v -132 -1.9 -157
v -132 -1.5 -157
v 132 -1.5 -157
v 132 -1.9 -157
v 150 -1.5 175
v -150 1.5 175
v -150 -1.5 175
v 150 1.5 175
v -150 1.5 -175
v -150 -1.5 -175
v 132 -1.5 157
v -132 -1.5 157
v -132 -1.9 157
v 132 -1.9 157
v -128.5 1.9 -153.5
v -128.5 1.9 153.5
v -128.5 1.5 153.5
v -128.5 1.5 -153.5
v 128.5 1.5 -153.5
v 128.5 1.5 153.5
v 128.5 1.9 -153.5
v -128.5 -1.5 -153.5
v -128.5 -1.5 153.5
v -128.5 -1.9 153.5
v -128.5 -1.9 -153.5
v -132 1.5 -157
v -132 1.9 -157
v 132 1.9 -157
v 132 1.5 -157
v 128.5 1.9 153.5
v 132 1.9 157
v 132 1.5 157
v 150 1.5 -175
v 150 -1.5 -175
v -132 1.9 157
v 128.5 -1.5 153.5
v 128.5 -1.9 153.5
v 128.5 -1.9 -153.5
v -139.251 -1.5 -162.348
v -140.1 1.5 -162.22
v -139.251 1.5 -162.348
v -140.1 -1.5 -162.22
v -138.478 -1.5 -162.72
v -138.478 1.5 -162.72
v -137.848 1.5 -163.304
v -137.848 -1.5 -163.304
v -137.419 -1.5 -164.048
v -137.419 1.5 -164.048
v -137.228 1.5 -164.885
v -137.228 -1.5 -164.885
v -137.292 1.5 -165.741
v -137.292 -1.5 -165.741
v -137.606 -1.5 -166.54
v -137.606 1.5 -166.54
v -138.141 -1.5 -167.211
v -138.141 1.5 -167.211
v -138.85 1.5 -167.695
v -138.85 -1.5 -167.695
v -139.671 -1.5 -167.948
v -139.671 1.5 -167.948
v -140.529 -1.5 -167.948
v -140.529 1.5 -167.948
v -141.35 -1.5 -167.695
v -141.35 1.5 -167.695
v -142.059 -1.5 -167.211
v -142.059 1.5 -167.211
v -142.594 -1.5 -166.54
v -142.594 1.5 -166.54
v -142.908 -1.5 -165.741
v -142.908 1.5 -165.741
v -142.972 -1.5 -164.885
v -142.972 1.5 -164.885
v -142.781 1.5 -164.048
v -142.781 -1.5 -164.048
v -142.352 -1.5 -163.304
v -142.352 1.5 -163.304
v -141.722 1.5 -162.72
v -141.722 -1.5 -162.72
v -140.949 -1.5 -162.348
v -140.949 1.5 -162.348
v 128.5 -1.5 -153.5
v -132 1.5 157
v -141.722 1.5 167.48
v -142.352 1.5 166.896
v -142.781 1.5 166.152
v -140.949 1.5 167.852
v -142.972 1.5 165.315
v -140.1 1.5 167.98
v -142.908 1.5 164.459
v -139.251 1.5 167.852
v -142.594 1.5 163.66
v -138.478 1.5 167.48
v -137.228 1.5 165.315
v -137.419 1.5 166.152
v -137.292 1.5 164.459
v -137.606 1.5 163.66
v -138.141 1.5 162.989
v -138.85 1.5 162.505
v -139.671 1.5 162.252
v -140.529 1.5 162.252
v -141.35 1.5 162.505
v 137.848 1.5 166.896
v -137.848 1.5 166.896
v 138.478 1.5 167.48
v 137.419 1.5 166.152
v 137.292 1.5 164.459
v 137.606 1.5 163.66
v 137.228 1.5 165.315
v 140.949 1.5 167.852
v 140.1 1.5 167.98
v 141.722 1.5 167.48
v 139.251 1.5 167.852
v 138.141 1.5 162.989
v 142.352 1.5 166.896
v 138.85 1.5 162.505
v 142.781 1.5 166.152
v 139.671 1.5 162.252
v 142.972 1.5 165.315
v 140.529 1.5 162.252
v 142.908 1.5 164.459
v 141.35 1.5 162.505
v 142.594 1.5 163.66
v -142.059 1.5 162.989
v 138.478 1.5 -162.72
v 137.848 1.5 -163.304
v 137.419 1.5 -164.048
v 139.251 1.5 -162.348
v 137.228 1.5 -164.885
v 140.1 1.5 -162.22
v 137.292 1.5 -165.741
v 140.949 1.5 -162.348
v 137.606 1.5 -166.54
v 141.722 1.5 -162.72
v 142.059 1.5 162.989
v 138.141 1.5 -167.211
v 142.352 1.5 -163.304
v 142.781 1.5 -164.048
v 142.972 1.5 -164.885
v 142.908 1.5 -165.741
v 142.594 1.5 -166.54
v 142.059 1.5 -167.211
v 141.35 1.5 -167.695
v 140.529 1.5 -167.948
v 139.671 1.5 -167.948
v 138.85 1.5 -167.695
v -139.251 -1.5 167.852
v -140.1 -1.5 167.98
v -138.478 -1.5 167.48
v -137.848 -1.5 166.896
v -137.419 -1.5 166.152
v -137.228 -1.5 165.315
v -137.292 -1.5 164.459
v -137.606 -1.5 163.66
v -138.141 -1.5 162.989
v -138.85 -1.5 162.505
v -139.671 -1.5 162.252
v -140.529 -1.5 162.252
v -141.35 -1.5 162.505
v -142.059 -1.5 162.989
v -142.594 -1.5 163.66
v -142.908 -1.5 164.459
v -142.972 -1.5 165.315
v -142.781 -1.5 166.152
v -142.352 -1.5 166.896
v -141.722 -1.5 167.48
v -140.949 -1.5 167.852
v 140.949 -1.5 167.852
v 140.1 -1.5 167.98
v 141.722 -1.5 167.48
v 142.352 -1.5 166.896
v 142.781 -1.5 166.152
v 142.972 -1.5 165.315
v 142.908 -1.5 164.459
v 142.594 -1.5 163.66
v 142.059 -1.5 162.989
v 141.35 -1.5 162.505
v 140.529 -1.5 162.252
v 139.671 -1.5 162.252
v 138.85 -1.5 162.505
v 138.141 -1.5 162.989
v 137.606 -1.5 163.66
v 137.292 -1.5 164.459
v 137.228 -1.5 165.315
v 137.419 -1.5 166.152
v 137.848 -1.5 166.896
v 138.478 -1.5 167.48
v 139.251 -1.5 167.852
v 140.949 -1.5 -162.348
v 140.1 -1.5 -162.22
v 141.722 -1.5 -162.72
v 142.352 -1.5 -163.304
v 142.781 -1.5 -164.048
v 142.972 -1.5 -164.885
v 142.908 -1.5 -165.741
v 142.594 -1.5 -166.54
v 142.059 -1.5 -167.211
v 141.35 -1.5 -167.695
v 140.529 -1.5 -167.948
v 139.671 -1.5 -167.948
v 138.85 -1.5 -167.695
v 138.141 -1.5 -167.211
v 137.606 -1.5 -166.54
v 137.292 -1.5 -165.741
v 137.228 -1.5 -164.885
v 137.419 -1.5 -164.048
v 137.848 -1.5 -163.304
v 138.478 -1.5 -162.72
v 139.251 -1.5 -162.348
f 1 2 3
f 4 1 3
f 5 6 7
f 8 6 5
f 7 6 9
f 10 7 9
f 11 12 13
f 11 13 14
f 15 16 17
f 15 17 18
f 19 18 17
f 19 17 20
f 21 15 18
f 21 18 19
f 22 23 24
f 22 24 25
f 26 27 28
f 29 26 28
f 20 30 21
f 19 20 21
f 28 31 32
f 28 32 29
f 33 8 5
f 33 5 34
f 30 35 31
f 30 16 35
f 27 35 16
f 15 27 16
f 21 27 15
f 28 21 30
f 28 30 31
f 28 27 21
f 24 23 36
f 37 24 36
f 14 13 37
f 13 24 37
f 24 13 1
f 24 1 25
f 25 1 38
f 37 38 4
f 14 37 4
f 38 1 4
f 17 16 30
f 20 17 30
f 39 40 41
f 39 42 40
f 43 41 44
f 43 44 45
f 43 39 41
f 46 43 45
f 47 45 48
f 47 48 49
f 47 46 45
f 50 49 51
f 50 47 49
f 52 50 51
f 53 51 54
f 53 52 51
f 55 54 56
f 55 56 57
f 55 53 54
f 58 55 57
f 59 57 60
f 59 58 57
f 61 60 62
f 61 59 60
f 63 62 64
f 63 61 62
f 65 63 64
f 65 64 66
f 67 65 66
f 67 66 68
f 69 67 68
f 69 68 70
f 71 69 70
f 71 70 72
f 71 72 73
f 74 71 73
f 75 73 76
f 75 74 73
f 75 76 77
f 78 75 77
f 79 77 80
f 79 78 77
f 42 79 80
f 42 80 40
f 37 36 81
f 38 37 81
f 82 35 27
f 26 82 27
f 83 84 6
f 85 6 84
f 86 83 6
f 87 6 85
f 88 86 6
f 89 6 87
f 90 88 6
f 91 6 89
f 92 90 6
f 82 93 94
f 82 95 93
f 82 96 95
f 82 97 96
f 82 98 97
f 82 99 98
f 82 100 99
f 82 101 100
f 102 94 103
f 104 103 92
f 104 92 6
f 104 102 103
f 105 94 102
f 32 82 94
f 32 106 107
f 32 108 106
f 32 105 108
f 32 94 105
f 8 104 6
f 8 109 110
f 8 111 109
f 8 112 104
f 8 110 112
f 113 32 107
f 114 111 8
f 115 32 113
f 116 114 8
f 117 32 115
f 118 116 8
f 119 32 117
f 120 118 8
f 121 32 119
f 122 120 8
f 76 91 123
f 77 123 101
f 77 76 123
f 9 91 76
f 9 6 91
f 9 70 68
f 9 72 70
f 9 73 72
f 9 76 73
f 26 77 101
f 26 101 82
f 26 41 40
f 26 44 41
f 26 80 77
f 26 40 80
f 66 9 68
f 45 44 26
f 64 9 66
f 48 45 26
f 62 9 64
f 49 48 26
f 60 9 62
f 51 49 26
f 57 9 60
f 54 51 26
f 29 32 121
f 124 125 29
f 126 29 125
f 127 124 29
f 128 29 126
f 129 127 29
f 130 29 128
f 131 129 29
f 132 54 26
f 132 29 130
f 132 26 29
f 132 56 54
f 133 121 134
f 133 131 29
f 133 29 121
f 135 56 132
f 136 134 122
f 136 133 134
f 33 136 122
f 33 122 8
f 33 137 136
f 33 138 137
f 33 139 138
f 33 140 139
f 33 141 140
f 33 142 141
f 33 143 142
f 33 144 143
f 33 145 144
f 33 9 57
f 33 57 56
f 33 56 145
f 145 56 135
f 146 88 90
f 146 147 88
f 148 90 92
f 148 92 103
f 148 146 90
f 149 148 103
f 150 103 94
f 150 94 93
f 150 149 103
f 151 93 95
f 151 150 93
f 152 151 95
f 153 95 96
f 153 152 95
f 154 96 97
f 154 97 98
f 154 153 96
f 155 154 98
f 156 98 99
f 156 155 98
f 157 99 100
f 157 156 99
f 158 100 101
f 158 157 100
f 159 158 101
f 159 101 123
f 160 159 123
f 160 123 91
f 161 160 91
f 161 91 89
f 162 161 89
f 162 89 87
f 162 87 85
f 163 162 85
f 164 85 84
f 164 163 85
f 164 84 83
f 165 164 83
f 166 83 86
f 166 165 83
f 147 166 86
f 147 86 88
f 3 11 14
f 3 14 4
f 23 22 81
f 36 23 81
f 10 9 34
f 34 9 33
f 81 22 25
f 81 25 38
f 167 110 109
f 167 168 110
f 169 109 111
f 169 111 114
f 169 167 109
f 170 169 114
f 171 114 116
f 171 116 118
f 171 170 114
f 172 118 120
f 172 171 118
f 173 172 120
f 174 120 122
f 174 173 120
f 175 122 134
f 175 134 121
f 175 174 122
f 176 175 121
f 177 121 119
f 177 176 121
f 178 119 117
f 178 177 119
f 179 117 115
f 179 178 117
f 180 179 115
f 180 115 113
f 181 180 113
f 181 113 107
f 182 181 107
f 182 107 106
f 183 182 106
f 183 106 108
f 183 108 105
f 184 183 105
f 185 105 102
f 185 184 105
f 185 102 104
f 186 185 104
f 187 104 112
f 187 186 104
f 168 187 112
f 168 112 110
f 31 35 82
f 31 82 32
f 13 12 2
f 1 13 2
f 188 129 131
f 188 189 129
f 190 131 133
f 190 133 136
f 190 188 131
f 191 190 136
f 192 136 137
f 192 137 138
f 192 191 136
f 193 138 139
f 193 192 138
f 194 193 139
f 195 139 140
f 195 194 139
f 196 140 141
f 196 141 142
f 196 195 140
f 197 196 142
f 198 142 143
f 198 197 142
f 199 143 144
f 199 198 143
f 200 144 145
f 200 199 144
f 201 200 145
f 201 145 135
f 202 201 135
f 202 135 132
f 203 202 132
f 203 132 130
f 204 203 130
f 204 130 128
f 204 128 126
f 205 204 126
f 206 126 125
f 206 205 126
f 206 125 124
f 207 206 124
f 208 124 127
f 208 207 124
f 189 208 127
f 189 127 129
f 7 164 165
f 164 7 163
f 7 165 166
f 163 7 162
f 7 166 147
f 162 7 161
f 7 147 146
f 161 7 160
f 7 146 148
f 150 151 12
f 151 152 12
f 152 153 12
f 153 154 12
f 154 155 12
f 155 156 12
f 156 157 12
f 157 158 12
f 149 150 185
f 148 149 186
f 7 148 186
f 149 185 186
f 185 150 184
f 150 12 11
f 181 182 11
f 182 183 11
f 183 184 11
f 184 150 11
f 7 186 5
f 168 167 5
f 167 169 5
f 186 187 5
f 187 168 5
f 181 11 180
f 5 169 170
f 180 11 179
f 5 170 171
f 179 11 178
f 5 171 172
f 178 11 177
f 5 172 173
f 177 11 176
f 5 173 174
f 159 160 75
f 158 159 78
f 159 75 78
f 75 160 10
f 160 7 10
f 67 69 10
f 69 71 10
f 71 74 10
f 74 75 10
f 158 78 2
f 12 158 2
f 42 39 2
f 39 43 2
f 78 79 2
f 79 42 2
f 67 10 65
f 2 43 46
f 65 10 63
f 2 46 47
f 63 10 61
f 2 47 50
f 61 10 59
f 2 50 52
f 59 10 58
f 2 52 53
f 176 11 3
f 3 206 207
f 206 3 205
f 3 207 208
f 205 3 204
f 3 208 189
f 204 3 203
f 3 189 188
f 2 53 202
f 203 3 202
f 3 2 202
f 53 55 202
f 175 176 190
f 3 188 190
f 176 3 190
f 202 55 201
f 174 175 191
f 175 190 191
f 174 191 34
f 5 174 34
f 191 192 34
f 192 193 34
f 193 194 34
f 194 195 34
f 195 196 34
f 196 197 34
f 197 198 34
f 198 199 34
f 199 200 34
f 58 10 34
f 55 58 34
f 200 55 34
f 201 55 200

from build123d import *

# Parameters (mm, degrees)
SKETCH1_W                                     = 300
SKETCH1_H                                     = 350
SKETCH1_R                                     = 2.88
ELECTRONICS_TRAY_STRUCTURAL_PANEL_DEPTH       = 1.5
SKETCH2_W                                     = 264
SKETCH2_H                                     = 314
SKETCH2_W_2                                   = 257
SKETCH2_H_2                                   = 307
ELECTRONICS_TRAY_STRUCTURAL_PANEL_INSET_DEPTH = 1.9


with BuildPart() as part:
    # Sketch1 → Electronics tray structural panel (new, symmetric)
    with BuildSketch(Plane(origin=(0, 0, 0), x_dir=(1, 0, 0), z_dir=(0, 1, 0))):
        Rectangle(SKETCH1_W, SKETCH1_H)
        with Locations(Location((140.1, 165.1, 0), (0, 0, 270))):
            Circle(SKETCH1_R, mode=Mode.SUBTRACT)
        with Locations(Location((-140.1, 165.1, 0), (0, 0, 270))):
            Circle(SKETCH1_R, mode=Mode.SUBTRACT)
        with Locations(Location((140.1, -165.1, 0), (0, 0, 270))):
            Circle(SKETCH1_R, mode=Mode.SUBTRACT)
        with Locations(Location((-140.1, -165.1, 0), (0, 0, 270))):
            Circle(SKETCH1_R, mode=Mode.SUBTRACT)
    extrude(amount=ELECTRONICS_TRAY_STRUCTURAL_PANEL_DEPTH, both=True)

    # Sketch2 → Electronics tray structural panel inset stiffener (add, symmetric)
    with BuildSketch(Plane(origin=(0, 0, 0), x_dir=(1, 0, 0), z_dir=(0, 1, 0))):
        Rectangle(SKETCH2_W, SKETCH2_H)
        Rectangle(SKETCH2_W_2, SKETCH2_H_2, mode=Mode.SUBTRACT)
    extrude(amount=ELECTRONICS_TRAY_STRUCTURAL_PANEL_INSET_DEPTH, both=True)


solid = part.part
